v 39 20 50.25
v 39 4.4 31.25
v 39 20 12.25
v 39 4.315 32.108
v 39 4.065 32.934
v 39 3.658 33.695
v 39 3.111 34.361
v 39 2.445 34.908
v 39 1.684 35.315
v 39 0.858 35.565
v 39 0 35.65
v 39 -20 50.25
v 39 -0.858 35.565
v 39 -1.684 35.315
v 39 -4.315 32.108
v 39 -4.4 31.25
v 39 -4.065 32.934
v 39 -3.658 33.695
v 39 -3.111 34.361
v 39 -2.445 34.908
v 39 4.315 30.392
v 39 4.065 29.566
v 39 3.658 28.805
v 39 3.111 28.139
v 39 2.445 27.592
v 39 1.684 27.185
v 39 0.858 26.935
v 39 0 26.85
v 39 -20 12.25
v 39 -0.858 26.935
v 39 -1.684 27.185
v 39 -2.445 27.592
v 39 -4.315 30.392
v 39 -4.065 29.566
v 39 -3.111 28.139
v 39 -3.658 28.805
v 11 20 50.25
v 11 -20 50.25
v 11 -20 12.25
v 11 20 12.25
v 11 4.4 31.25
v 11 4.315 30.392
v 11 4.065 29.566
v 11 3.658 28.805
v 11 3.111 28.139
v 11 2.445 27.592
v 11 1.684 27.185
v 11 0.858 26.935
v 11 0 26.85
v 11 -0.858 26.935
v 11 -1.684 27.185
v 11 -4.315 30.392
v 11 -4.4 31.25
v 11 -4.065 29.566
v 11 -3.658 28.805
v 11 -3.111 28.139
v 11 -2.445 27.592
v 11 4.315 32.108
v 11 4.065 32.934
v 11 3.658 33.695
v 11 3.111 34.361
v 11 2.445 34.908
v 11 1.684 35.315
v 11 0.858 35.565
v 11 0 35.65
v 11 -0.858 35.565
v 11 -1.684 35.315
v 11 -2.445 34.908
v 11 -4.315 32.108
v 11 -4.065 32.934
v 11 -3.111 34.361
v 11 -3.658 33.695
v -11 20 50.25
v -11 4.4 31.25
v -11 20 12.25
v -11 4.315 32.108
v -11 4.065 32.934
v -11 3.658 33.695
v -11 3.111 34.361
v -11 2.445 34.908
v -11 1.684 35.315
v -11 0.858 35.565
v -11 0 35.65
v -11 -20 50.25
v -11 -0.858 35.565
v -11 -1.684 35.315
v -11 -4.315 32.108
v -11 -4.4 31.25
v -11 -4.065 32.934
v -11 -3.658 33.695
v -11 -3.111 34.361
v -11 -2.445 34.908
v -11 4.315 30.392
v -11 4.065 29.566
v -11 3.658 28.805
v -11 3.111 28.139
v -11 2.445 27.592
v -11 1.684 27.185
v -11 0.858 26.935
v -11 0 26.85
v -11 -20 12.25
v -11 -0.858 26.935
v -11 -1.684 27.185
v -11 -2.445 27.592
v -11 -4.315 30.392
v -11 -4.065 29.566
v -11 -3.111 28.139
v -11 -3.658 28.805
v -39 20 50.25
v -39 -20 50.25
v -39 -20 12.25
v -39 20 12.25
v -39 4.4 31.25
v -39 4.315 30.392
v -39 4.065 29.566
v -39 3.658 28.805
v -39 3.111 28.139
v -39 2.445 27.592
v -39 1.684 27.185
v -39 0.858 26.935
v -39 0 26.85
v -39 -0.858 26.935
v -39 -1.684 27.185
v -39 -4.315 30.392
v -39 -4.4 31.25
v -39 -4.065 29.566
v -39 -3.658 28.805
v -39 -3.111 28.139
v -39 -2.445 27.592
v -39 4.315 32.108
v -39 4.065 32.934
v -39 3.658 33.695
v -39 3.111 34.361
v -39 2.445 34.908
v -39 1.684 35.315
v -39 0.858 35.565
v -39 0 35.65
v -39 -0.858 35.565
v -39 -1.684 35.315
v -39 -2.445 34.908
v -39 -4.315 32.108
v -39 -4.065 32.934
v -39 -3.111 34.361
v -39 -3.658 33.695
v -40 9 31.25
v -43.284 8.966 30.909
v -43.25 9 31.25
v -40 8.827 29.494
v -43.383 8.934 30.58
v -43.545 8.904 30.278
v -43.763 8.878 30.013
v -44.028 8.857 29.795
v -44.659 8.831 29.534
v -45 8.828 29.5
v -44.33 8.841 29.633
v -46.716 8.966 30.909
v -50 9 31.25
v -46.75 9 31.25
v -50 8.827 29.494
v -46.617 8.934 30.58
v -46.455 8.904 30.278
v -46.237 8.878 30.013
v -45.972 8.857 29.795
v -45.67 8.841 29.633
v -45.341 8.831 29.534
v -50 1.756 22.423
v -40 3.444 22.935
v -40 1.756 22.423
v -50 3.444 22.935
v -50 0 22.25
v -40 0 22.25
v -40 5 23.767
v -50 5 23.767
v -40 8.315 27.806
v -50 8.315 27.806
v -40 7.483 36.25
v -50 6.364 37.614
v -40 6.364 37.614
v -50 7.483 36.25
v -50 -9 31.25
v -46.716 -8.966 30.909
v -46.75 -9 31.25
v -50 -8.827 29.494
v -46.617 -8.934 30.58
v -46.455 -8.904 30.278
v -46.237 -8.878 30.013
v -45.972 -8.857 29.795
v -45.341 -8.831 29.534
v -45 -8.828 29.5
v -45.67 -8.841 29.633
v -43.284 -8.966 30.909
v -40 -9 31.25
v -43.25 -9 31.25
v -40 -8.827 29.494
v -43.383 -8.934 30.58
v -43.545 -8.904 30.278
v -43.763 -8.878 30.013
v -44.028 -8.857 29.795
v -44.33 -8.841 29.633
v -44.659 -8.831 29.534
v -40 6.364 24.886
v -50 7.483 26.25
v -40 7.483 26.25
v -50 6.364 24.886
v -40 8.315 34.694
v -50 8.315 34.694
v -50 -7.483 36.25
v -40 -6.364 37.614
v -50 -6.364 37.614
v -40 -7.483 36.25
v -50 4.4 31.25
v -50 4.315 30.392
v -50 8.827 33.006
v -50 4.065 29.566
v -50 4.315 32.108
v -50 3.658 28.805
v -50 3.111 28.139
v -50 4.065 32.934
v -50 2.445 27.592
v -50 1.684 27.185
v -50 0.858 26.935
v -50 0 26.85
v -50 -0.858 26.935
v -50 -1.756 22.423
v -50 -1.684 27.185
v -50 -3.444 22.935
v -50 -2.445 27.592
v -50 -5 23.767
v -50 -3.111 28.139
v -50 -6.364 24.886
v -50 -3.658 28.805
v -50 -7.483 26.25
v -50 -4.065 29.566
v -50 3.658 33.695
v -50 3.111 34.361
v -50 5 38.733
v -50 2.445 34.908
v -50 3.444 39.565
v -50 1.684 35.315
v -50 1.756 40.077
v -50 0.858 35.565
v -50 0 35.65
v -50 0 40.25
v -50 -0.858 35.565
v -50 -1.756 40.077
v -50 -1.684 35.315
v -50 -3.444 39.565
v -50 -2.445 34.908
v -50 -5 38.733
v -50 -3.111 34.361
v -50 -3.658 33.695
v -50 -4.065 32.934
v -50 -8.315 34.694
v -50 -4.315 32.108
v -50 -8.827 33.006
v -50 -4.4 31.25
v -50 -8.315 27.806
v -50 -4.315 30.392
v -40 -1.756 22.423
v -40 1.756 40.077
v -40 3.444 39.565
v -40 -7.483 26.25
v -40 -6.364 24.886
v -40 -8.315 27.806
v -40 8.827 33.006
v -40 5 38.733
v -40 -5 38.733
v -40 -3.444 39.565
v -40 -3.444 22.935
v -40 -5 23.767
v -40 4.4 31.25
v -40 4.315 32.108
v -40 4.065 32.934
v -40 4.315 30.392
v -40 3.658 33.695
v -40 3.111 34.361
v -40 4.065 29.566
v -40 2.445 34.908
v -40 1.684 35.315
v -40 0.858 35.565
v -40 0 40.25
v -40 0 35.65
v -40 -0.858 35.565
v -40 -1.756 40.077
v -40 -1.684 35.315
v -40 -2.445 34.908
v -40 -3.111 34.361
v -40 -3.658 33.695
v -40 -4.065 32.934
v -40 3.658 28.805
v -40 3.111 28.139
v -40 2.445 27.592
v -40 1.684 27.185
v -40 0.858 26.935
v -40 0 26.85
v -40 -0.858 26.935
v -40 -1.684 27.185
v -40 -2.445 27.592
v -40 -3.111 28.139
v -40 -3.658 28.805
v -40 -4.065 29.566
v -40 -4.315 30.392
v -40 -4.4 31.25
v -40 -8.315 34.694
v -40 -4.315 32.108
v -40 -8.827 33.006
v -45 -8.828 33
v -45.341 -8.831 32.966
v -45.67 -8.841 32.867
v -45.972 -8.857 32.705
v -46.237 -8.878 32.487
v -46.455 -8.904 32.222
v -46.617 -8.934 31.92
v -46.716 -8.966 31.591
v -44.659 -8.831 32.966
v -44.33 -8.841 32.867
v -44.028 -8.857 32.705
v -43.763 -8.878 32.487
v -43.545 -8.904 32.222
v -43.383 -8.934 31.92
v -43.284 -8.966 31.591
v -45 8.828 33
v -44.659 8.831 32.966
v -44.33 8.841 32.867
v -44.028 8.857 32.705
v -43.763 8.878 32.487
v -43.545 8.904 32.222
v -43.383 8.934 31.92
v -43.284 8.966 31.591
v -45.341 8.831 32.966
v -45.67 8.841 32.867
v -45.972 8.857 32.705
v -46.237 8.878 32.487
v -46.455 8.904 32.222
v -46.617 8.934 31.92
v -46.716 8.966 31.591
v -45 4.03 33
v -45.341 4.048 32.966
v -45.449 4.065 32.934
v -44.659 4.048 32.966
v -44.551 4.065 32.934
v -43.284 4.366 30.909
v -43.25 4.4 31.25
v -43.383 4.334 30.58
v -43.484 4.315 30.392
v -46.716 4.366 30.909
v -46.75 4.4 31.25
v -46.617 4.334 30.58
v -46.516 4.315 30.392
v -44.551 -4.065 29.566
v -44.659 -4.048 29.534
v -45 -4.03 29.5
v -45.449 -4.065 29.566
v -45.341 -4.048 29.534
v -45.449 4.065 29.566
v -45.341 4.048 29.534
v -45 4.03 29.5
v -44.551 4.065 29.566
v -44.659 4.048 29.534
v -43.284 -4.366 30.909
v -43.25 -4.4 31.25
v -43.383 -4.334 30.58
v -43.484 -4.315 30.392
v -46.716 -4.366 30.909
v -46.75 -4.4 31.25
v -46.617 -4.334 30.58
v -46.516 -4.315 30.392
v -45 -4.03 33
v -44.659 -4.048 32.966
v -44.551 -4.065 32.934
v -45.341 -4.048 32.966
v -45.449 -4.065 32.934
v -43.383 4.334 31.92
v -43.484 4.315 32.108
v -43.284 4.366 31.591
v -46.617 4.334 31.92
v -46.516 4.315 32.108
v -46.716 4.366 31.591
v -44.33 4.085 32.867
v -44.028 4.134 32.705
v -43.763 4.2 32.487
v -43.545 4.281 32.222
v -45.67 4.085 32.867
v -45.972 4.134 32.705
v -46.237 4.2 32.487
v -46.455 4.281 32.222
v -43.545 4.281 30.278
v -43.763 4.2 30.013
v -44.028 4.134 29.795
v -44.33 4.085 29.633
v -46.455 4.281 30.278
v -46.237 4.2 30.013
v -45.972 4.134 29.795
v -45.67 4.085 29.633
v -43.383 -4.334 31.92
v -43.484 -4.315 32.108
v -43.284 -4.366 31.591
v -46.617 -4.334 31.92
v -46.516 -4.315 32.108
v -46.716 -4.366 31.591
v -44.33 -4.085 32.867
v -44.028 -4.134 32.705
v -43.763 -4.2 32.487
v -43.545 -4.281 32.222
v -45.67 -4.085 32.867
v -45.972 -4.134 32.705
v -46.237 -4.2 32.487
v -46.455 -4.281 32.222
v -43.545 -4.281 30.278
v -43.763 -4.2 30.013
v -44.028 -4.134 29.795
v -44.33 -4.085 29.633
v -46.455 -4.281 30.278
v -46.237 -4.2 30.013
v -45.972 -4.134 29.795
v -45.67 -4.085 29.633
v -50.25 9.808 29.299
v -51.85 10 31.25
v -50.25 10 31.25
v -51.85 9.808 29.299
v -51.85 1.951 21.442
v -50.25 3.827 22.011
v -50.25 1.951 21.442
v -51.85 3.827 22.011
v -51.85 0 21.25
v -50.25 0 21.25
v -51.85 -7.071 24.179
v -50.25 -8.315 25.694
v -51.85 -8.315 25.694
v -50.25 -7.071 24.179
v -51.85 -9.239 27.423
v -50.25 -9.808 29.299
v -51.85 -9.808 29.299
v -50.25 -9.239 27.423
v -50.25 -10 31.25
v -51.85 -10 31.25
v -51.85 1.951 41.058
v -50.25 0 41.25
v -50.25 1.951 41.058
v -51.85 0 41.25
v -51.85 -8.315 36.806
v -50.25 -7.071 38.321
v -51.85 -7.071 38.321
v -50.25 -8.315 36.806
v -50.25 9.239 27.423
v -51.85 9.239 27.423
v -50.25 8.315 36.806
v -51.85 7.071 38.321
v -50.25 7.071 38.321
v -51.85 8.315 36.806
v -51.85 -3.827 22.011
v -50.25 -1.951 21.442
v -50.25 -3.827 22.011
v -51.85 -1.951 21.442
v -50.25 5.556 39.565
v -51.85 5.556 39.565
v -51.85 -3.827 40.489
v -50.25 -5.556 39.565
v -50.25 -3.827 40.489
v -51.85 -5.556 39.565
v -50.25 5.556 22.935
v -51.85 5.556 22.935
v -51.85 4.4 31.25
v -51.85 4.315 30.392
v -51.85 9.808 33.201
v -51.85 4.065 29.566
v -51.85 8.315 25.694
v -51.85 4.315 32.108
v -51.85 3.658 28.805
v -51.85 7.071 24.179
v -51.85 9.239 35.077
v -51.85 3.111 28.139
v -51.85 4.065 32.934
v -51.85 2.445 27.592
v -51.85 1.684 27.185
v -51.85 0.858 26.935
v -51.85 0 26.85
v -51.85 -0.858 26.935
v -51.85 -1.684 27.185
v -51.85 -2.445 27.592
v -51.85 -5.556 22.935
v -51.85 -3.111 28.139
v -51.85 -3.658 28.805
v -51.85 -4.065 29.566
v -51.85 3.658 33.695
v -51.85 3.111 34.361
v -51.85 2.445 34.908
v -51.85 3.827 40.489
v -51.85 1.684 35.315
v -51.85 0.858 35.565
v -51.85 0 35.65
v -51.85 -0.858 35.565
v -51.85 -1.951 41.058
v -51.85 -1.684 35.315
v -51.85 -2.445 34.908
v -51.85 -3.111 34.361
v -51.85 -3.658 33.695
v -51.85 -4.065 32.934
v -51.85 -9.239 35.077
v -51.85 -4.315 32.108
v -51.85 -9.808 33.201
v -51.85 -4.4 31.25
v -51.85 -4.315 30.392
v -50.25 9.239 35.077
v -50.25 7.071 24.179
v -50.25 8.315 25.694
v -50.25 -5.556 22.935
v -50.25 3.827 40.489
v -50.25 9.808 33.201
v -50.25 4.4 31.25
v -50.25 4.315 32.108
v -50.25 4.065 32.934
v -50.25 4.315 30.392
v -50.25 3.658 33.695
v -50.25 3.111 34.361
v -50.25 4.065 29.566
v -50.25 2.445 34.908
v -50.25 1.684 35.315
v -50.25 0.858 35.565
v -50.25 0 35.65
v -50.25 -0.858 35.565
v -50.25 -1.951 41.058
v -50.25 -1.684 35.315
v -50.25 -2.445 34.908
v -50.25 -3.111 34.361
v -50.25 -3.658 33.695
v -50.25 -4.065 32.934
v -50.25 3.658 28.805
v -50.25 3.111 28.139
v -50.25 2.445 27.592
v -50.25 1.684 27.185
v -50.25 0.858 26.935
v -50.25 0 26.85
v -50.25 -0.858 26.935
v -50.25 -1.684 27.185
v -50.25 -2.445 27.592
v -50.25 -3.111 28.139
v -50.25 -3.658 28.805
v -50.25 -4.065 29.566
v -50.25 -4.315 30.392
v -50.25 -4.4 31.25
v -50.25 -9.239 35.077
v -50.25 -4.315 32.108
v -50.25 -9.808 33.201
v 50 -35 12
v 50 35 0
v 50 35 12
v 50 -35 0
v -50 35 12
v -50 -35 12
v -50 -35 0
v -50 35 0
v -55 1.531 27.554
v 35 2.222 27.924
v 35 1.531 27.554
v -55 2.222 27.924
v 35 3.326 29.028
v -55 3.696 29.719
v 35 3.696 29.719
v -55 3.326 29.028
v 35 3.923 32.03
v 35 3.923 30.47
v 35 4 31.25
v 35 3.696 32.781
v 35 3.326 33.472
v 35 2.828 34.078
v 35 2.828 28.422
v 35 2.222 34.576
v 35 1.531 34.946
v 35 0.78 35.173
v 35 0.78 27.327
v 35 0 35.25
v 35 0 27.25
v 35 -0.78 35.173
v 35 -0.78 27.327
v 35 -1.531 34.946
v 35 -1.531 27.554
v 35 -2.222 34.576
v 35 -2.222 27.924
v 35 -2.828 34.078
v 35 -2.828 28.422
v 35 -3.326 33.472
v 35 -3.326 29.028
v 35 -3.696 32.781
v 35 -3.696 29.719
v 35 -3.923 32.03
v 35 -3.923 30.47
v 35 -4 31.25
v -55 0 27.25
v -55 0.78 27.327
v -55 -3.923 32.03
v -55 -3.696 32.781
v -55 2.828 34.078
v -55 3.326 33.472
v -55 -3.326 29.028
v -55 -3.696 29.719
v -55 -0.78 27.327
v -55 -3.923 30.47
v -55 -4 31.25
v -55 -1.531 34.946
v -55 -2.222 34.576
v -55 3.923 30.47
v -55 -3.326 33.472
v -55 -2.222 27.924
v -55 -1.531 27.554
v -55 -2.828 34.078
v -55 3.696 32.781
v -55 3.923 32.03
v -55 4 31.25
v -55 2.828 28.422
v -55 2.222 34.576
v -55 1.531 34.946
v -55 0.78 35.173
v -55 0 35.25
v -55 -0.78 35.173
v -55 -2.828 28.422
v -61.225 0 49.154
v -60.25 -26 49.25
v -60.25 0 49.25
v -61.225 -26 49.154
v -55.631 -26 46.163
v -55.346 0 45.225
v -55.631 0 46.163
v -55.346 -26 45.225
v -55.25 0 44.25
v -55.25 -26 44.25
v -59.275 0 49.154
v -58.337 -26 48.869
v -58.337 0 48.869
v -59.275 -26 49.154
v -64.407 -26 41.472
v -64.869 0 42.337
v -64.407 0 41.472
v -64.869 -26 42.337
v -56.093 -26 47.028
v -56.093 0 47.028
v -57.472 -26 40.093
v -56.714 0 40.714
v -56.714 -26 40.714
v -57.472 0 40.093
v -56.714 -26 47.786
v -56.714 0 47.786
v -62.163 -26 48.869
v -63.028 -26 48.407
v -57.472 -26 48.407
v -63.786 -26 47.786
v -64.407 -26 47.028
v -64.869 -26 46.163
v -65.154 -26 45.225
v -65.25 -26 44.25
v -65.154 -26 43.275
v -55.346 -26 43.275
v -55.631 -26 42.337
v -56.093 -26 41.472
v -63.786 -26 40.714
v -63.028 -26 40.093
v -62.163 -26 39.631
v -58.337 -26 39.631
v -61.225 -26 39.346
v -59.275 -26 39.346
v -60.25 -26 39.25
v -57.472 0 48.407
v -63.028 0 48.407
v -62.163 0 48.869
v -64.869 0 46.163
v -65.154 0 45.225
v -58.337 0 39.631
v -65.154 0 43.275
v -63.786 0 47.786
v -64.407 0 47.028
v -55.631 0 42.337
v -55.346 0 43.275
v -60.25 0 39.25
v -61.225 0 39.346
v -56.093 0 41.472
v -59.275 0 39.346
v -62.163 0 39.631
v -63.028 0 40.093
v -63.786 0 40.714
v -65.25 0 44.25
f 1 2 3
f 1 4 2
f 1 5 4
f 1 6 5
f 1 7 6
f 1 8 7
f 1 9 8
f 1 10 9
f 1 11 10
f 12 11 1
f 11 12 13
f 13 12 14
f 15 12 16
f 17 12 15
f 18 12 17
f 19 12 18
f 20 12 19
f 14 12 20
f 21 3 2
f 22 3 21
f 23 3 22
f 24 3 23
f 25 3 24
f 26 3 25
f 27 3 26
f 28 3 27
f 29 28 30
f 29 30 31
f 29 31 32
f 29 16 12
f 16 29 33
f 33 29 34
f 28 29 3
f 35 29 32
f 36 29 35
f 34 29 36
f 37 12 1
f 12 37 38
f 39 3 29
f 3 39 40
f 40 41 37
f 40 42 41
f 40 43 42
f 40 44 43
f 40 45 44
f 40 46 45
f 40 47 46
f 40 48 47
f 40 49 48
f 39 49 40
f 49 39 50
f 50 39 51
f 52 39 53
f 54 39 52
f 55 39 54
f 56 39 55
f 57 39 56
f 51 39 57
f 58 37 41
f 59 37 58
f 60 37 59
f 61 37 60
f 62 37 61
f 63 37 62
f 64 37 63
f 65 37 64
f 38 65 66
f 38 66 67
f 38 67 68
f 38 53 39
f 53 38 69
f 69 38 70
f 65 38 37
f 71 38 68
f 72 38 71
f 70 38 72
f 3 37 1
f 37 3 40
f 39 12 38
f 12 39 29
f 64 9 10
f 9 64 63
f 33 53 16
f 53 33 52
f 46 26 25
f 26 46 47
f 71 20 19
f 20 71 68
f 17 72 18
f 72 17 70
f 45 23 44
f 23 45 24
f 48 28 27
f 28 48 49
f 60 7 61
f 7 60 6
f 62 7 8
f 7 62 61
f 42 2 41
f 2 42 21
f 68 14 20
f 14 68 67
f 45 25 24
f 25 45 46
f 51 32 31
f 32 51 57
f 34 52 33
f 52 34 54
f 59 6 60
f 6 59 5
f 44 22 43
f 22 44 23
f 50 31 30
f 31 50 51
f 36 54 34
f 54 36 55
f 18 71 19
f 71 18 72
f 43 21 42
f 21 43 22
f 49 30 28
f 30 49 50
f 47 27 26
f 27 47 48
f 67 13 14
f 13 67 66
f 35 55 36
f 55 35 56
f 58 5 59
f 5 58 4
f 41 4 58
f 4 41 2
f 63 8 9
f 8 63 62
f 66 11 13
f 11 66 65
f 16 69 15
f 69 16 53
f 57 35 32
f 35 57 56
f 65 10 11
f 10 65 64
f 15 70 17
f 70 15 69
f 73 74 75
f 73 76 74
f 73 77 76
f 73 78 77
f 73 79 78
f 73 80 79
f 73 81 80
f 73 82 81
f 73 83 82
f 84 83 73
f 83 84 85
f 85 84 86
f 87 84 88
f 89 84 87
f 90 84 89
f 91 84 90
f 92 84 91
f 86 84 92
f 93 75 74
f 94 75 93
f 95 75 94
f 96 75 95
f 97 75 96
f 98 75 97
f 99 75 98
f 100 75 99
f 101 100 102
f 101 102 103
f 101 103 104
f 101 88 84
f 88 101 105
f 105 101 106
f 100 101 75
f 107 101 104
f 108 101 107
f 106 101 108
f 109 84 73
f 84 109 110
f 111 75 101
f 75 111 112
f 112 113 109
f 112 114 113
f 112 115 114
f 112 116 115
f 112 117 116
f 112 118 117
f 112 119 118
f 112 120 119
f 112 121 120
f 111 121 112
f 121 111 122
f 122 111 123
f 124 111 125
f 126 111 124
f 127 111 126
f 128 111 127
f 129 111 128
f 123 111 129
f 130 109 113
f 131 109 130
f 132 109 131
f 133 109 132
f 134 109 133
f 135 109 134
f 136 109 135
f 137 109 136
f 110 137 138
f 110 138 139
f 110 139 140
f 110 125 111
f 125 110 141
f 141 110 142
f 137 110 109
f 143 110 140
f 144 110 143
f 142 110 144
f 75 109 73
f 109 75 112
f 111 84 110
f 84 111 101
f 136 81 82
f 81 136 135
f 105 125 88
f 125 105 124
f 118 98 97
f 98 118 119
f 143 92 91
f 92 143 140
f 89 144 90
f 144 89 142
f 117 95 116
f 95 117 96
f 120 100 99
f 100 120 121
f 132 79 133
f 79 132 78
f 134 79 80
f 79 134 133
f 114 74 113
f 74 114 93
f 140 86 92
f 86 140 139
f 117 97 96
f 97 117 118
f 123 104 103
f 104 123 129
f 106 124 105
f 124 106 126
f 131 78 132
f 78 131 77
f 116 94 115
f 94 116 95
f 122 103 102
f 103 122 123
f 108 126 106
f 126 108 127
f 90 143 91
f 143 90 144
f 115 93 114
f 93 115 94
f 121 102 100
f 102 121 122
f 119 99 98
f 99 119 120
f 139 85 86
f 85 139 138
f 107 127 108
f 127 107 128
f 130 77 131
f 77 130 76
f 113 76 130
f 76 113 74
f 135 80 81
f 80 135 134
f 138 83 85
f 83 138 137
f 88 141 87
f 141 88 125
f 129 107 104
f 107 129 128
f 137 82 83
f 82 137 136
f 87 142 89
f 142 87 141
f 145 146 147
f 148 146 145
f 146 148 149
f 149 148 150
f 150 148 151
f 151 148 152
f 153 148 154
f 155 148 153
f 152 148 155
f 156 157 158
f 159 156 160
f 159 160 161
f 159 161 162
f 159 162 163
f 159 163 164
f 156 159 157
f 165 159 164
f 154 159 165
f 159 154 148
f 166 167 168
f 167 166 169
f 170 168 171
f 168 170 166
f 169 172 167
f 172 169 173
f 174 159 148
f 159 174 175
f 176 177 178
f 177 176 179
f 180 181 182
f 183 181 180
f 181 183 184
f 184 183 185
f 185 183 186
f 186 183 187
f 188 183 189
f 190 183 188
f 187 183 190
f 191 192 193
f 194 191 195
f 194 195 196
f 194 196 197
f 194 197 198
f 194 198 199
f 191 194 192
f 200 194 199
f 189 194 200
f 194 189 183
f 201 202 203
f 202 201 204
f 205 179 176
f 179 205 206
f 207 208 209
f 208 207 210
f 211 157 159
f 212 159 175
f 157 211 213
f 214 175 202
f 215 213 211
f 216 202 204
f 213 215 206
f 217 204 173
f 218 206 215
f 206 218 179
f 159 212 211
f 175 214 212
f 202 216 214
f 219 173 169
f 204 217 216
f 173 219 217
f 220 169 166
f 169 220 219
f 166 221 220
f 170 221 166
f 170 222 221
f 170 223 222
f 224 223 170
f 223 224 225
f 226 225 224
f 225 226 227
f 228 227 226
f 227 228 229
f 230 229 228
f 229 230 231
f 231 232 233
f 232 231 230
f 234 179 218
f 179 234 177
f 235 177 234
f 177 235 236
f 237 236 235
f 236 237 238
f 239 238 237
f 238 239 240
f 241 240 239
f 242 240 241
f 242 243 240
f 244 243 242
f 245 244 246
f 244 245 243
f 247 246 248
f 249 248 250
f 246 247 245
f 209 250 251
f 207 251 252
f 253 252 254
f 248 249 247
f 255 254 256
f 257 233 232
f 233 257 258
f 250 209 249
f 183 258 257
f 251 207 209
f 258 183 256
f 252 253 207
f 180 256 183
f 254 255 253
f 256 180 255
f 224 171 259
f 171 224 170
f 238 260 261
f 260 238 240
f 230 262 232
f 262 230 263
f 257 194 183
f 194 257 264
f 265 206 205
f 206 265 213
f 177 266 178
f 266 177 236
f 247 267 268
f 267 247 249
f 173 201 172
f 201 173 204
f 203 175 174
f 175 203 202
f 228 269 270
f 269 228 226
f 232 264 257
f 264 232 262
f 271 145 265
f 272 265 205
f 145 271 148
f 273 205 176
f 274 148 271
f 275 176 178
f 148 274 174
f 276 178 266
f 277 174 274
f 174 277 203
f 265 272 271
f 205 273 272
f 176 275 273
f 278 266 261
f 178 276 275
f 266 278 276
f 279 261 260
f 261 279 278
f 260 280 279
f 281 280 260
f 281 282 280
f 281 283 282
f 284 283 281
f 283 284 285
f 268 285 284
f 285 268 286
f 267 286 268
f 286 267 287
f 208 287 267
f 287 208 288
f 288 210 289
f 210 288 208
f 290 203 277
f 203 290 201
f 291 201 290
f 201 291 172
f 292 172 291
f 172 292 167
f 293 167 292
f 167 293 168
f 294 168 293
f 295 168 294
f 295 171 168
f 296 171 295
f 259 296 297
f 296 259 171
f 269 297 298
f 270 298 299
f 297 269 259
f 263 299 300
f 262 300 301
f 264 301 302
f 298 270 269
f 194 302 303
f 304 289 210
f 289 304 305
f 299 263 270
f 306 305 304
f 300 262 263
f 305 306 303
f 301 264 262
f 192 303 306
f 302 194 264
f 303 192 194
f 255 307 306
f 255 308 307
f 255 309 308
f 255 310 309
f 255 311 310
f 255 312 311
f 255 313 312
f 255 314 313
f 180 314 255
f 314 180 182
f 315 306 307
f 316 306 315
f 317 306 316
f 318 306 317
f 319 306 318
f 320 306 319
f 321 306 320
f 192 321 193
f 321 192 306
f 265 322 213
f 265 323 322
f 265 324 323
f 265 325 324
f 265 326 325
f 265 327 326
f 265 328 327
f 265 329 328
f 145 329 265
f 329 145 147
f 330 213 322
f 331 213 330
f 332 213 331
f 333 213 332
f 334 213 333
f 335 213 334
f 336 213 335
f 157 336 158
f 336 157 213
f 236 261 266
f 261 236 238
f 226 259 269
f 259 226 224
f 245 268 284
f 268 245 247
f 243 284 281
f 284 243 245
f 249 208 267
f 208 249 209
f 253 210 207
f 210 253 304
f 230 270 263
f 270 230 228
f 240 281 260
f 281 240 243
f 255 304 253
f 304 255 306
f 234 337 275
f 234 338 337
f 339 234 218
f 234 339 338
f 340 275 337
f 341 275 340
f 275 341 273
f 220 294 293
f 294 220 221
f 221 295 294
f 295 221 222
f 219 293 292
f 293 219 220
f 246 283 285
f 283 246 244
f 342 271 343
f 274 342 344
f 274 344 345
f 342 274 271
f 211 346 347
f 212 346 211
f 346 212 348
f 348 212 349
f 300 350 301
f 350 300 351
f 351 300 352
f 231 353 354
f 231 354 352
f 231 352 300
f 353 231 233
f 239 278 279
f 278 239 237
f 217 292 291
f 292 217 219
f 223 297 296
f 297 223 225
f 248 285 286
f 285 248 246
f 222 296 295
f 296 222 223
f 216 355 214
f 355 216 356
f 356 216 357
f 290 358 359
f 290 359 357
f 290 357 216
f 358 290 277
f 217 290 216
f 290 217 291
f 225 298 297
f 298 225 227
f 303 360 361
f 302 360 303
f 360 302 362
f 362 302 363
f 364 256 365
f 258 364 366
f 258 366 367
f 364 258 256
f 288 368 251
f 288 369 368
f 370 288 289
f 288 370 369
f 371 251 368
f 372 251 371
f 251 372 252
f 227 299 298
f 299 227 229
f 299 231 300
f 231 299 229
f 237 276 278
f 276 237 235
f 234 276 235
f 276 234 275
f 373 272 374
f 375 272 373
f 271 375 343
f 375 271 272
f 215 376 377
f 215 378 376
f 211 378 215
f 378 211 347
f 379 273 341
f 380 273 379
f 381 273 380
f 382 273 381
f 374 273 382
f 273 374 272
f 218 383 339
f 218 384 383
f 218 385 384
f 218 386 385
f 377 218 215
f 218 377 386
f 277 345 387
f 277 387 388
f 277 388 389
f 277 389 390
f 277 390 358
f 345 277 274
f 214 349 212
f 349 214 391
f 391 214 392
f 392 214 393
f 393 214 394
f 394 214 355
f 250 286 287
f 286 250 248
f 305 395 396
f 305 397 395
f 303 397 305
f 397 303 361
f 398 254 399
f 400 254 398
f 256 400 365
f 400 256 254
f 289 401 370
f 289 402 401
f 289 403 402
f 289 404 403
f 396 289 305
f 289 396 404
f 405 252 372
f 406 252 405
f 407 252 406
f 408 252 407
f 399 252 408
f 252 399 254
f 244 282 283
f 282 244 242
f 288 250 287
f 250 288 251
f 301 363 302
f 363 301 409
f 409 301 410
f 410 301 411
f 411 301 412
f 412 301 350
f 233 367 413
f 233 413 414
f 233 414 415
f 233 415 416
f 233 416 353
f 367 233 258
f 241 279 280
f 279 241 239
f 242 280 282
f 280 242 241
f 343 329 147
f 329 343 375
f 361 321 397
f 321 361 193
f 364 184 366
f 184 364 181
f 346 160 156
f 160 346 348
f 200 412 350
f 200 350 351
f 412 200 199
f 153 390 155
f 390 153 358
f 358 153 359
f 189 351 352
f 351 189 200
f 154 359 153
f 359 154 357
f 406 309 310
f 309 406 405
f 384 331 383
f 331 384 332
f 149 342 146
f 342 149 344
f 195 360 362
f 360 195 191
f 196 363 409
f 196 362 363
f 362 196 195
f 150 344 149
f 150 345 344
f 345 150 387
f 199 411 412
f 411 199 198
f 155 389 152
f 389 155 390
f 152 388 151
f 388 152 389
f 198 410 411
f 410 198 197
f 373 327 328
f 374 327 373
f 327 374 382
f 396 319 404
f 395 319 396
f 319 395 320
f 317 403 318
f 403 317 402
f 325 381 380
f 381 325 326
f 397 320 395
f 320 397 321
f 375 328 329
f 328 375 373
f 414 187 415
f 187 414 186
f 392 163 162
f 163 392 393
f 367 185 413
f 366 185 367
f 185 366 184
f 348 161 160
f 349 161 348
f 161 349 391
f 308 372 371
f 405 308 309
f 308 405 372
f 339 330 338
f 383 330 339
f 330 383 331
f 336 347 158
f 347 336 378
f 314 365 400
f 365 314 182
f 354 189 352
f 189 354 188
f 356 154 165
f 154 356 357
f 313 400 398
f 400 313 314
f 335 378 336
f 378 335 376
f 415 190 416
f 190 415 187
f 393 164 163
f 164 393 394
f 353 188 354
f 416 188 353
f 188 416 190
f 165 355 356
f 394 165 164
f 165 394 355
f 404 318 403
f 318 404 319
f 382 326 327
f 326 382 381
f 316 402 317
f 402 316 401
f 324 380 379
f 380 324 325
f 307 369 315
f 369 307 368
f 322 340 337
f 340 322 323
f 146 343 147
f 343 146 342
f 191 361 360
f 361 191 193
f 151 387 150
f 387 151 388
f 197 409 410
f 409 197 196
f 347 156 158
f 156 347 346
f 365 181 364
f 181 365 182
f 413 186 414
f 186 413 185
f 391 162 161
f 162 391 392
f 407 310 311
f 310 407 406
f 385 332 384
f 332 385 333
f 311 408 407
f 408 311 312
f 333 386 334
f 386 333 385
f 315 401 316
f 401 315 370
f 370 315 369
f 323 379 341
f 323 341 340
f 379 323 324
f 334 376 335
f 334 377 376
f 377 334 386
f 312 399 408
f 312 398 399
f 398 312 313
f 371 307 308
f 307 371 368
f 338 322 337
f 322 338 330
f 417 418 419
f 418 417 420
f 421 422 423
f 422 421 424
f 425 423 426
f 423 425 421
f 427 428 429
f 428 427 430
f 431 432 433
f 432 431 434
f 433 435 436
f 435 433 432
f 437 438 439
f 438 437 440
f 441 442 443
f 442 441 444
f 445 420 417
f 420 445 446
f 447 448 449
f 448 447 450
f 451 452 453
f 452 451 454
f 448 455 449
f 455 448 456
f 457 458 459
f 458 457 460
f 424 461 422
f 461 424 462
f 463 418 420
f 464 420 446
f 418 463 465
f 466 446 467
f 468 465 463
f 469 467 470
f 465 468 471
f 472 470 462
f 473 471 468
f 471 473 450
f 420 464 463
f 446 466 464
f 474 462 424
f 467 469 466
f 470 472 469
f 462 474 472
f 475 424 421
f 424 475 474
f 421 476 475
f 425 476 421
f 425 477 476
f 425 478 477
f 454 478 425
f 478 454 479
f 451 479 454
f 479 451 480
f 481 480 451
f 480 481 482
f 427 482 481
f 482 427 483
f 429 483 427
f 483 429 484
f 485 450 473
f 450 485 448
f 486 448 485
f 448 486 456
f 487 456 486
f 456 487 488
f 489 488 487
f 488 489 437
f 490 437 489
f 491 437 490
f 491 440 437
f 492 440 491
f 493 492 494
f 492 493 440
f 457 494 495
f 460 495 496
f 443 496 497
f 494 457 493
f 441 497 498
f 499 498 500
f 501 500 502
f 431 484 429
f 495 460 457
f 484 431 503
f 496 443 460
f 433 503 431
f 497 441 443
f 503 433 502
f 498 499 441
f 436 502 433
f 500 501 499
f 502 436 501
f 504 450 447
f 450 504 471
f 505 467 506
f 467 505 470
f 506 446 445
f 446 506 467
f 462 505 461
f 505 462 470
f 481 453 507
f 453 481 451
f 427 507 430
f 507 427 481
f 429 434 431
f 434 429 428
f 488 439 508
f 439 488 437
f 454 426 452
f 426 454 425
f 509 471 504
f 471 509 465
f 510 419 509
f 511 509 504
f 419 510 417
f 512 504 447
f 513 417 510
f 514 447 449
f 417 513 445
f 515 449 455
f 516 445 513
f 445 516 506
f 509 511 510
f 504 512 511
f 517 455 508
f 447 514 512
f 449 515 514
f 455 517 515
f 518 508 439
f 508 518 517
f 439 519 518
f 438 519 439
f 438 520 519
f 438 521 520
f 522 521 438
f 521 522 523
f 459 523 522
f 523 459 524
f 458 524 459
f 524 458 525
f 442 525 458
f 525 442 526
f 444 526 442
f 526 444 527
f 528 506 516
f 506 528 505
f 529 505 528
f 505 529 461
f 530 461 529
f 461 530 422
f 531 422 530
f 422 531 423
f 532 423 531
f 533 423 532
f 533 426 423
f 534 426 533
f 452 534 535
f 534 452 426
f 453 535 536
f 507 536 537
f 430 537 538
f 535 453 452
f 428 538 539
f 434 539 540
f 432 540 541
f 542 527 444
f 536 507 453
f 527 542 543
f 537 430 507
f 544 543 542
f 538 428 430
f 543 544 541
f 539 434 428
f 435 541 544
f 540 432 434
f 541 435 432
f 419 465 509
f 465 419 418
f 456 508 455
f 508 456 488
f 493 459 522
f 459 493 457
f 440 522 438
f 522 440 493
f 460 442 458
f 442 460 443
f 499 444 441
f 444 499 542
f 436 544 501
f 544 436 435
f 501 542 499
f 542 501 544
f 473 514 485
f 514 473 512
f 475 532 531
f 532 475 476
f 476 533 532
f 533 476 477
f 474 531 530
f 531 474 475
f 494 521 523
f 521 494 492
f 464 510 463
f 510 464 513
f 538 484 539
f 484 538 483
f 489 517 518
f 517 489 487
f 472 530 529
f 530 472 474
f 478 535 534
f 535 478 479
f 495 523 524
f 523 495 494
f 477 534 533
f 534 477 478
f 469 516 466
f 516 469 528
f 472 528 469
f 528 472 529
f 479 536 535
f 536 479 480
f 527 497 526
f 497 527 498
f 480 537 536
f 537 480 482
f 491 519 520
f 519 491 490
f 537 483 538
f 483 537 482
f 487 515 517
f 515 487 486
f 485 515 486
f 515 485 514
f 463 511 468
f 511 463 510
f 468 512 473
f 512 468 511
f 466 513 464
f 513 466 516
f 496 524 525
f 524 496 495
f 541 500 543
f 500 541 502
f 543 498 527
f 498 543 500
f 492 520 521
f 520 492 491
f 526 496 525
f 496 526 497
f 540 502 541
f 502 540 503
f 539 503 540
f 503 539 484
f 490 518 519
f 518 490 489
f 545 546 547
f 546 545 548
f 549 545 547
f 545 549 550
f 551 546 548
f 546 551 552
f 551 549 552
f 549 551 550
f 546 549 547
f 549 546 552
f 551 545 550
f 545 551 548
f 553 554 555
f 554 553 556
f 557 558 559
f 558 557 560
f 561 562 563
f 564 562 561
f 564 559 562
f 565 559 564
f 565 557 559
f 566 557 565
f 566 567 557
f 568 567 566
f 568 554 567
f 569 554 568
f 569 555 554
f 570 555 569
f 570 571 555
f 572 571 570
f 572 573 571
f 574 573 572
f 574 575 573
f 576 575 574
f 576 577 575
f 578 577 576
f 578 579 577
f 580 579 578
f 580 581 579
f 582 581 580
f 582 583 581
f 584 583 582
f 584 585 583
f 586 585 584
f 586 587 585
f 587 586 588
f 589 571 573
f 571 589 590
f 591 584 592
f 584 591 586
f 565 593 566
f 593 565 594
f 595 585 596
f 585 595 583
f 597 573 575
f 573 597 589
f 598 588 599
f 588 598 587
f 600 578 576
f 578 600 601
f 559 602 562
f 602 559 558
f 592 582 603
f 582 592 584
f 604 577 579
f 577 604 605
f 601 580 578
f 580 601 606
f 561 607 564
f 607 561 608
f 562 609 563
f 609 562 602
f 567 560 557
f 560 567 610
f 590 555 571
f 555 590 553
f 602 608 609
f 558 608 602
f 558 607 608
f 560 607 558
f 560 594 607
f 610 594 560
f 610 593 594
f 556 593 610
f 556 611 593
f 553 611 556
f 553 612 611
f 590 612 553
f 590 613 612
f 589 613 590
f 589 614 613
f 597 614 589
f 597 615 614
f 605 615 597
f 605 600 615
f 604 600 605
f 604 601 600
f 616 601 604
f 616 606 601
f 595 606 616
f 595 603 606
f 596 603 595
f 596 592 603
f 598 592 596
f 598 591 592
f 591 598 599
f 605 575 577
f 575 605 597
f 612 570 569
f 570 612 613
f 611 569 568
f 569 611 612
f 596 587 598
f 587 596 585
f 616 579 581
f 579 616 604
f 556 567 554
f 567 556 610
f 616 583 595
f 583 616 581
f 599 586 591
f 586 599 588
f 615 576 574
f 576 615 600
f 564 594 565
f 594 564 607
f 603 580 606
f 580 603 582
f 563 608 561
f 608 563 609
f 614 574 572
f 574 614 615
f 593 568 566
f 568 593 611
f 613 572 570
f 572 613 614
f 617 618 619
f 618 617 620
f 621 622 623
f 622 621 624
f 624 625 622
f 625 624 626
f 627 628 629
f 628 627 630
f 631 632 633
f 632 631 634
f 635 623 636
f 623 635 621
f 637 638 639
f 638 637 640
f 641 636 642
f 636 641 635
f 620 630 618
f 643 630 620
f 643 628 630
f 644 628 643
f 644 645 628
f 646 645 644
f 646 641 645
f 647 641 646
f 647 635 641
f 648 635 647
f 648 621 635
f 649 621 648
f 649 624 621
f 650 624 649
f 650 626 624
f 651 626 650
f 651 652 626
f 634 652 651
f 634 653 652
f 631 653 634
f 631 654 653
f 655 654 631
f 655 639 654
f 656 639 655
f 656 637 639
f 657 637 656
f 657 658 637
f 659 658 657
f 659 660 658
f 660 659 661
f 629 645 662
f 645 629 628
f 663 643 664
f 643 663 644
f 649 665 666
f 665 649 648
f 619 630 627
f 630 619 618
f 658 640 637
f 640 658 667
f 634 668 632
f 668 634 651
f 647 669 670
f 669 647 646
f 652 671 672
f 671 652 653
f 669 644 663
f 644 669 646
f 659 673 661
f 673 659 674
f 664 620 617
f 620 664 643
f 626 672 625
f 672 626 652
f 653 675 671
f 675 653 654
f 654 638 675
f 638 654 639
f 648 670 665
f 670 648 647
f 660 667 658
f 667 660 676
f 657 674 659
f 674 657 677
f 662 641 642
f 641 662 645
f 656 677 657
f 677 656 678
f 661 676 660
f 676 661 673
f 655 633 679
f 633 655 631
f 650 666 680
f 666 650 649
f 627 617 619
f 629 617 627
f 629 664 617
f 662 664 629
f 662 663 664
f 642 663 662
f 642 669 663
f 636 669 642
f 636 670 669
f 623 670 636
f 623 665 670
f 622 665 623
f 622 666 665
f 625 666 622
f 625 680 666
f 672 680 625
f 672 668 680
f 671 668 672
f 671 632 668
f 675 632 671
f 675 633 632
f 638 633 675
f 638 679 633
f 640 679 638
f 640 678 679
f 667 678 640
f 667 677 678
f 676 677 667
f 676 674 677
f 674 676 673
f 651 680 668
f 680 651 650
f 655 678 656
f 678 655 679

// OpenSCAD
$fn = 32;

// ------------------------------------------------------------------------
// Machine vise: screw d8, jaws 28 x 38 mm
// Every part is its own module, assembly() places every instance.
// ------------------------------------------------------------------------

// --- part 1 ---
module vise_bed() {
  difference() {
    translate([-50, -35, 0]) cube([100, 70, 12]);
  }
}

// --- part 2 ---
module vise_jaw() {
  difference() {
    translate([-14, -20, 0]) cube([28, 40, 38]);
    translate([0, 0, 19]) rotate([0, 90, 0]) cylinder(h = 30, d = 8.8, center = true);
  }
}

// --- part 3 ---
module vise_screw() {
  translate([0, 0, -45]) cylinder(h = 90, d = 8);
}

// --- part 4 ---
module screw_collar() {
  difference() {
    cylinder(h = 10, d = 18);
    translate([0, 0, -1]) cylinder(h = 12, d = 8.8);
    translate([0, 0, 5]) rotate([90, 0, 0]) cylinder(h = 20, d = 3.5, center = true);
  }
}

// --- part 5 ---
module screw_washer() {
  difference() {
      translate([0, 0, 0]) cylinder(h = 1.6, d = 20);
      translate([0, 0, -1]) cylinder(h = 3.6, d = 8.8);
    }
}

// --- part 6 ---
module vise_handle() {
  cylinder(h = 26, d = 10);
}

// --- assembly ---
module assembly() {
  color([0.80, 0.24, 0.20]) translate([0, 0, 0]) rotate([0, 0, 0]) vise_bed();
  color([0.20, 0.45, 0.75]) translate([25, 0, 12.25]) rotate([0, 0, 0]) vise_jaw();
  color([0.25, 0.62, 0.32]) translate([-25, 0, 12.25]) rotate([0, 0, 0]) vise_jaw();
  color([0.92, 0.70, 0.18]) translate([-10, 0, 31.25]) rotate([0, 90, 0]) vise_screw();
  color([0.58, 0.35, 0.70]) translate([-50, 0, 31.25]) rotate([0, 90, 0]) screw_collar();
  color([0.16, 0.66, 0.66]) translate([-51.85, 0, 31.25]) rotate([0, 90, 0]) screw_washer();
  color([0.85, 0.48, 0.18]) translate([-60.25, 0, 44.25]) rotate([90, 0, 0]) vise_handle();
}

assembly();
